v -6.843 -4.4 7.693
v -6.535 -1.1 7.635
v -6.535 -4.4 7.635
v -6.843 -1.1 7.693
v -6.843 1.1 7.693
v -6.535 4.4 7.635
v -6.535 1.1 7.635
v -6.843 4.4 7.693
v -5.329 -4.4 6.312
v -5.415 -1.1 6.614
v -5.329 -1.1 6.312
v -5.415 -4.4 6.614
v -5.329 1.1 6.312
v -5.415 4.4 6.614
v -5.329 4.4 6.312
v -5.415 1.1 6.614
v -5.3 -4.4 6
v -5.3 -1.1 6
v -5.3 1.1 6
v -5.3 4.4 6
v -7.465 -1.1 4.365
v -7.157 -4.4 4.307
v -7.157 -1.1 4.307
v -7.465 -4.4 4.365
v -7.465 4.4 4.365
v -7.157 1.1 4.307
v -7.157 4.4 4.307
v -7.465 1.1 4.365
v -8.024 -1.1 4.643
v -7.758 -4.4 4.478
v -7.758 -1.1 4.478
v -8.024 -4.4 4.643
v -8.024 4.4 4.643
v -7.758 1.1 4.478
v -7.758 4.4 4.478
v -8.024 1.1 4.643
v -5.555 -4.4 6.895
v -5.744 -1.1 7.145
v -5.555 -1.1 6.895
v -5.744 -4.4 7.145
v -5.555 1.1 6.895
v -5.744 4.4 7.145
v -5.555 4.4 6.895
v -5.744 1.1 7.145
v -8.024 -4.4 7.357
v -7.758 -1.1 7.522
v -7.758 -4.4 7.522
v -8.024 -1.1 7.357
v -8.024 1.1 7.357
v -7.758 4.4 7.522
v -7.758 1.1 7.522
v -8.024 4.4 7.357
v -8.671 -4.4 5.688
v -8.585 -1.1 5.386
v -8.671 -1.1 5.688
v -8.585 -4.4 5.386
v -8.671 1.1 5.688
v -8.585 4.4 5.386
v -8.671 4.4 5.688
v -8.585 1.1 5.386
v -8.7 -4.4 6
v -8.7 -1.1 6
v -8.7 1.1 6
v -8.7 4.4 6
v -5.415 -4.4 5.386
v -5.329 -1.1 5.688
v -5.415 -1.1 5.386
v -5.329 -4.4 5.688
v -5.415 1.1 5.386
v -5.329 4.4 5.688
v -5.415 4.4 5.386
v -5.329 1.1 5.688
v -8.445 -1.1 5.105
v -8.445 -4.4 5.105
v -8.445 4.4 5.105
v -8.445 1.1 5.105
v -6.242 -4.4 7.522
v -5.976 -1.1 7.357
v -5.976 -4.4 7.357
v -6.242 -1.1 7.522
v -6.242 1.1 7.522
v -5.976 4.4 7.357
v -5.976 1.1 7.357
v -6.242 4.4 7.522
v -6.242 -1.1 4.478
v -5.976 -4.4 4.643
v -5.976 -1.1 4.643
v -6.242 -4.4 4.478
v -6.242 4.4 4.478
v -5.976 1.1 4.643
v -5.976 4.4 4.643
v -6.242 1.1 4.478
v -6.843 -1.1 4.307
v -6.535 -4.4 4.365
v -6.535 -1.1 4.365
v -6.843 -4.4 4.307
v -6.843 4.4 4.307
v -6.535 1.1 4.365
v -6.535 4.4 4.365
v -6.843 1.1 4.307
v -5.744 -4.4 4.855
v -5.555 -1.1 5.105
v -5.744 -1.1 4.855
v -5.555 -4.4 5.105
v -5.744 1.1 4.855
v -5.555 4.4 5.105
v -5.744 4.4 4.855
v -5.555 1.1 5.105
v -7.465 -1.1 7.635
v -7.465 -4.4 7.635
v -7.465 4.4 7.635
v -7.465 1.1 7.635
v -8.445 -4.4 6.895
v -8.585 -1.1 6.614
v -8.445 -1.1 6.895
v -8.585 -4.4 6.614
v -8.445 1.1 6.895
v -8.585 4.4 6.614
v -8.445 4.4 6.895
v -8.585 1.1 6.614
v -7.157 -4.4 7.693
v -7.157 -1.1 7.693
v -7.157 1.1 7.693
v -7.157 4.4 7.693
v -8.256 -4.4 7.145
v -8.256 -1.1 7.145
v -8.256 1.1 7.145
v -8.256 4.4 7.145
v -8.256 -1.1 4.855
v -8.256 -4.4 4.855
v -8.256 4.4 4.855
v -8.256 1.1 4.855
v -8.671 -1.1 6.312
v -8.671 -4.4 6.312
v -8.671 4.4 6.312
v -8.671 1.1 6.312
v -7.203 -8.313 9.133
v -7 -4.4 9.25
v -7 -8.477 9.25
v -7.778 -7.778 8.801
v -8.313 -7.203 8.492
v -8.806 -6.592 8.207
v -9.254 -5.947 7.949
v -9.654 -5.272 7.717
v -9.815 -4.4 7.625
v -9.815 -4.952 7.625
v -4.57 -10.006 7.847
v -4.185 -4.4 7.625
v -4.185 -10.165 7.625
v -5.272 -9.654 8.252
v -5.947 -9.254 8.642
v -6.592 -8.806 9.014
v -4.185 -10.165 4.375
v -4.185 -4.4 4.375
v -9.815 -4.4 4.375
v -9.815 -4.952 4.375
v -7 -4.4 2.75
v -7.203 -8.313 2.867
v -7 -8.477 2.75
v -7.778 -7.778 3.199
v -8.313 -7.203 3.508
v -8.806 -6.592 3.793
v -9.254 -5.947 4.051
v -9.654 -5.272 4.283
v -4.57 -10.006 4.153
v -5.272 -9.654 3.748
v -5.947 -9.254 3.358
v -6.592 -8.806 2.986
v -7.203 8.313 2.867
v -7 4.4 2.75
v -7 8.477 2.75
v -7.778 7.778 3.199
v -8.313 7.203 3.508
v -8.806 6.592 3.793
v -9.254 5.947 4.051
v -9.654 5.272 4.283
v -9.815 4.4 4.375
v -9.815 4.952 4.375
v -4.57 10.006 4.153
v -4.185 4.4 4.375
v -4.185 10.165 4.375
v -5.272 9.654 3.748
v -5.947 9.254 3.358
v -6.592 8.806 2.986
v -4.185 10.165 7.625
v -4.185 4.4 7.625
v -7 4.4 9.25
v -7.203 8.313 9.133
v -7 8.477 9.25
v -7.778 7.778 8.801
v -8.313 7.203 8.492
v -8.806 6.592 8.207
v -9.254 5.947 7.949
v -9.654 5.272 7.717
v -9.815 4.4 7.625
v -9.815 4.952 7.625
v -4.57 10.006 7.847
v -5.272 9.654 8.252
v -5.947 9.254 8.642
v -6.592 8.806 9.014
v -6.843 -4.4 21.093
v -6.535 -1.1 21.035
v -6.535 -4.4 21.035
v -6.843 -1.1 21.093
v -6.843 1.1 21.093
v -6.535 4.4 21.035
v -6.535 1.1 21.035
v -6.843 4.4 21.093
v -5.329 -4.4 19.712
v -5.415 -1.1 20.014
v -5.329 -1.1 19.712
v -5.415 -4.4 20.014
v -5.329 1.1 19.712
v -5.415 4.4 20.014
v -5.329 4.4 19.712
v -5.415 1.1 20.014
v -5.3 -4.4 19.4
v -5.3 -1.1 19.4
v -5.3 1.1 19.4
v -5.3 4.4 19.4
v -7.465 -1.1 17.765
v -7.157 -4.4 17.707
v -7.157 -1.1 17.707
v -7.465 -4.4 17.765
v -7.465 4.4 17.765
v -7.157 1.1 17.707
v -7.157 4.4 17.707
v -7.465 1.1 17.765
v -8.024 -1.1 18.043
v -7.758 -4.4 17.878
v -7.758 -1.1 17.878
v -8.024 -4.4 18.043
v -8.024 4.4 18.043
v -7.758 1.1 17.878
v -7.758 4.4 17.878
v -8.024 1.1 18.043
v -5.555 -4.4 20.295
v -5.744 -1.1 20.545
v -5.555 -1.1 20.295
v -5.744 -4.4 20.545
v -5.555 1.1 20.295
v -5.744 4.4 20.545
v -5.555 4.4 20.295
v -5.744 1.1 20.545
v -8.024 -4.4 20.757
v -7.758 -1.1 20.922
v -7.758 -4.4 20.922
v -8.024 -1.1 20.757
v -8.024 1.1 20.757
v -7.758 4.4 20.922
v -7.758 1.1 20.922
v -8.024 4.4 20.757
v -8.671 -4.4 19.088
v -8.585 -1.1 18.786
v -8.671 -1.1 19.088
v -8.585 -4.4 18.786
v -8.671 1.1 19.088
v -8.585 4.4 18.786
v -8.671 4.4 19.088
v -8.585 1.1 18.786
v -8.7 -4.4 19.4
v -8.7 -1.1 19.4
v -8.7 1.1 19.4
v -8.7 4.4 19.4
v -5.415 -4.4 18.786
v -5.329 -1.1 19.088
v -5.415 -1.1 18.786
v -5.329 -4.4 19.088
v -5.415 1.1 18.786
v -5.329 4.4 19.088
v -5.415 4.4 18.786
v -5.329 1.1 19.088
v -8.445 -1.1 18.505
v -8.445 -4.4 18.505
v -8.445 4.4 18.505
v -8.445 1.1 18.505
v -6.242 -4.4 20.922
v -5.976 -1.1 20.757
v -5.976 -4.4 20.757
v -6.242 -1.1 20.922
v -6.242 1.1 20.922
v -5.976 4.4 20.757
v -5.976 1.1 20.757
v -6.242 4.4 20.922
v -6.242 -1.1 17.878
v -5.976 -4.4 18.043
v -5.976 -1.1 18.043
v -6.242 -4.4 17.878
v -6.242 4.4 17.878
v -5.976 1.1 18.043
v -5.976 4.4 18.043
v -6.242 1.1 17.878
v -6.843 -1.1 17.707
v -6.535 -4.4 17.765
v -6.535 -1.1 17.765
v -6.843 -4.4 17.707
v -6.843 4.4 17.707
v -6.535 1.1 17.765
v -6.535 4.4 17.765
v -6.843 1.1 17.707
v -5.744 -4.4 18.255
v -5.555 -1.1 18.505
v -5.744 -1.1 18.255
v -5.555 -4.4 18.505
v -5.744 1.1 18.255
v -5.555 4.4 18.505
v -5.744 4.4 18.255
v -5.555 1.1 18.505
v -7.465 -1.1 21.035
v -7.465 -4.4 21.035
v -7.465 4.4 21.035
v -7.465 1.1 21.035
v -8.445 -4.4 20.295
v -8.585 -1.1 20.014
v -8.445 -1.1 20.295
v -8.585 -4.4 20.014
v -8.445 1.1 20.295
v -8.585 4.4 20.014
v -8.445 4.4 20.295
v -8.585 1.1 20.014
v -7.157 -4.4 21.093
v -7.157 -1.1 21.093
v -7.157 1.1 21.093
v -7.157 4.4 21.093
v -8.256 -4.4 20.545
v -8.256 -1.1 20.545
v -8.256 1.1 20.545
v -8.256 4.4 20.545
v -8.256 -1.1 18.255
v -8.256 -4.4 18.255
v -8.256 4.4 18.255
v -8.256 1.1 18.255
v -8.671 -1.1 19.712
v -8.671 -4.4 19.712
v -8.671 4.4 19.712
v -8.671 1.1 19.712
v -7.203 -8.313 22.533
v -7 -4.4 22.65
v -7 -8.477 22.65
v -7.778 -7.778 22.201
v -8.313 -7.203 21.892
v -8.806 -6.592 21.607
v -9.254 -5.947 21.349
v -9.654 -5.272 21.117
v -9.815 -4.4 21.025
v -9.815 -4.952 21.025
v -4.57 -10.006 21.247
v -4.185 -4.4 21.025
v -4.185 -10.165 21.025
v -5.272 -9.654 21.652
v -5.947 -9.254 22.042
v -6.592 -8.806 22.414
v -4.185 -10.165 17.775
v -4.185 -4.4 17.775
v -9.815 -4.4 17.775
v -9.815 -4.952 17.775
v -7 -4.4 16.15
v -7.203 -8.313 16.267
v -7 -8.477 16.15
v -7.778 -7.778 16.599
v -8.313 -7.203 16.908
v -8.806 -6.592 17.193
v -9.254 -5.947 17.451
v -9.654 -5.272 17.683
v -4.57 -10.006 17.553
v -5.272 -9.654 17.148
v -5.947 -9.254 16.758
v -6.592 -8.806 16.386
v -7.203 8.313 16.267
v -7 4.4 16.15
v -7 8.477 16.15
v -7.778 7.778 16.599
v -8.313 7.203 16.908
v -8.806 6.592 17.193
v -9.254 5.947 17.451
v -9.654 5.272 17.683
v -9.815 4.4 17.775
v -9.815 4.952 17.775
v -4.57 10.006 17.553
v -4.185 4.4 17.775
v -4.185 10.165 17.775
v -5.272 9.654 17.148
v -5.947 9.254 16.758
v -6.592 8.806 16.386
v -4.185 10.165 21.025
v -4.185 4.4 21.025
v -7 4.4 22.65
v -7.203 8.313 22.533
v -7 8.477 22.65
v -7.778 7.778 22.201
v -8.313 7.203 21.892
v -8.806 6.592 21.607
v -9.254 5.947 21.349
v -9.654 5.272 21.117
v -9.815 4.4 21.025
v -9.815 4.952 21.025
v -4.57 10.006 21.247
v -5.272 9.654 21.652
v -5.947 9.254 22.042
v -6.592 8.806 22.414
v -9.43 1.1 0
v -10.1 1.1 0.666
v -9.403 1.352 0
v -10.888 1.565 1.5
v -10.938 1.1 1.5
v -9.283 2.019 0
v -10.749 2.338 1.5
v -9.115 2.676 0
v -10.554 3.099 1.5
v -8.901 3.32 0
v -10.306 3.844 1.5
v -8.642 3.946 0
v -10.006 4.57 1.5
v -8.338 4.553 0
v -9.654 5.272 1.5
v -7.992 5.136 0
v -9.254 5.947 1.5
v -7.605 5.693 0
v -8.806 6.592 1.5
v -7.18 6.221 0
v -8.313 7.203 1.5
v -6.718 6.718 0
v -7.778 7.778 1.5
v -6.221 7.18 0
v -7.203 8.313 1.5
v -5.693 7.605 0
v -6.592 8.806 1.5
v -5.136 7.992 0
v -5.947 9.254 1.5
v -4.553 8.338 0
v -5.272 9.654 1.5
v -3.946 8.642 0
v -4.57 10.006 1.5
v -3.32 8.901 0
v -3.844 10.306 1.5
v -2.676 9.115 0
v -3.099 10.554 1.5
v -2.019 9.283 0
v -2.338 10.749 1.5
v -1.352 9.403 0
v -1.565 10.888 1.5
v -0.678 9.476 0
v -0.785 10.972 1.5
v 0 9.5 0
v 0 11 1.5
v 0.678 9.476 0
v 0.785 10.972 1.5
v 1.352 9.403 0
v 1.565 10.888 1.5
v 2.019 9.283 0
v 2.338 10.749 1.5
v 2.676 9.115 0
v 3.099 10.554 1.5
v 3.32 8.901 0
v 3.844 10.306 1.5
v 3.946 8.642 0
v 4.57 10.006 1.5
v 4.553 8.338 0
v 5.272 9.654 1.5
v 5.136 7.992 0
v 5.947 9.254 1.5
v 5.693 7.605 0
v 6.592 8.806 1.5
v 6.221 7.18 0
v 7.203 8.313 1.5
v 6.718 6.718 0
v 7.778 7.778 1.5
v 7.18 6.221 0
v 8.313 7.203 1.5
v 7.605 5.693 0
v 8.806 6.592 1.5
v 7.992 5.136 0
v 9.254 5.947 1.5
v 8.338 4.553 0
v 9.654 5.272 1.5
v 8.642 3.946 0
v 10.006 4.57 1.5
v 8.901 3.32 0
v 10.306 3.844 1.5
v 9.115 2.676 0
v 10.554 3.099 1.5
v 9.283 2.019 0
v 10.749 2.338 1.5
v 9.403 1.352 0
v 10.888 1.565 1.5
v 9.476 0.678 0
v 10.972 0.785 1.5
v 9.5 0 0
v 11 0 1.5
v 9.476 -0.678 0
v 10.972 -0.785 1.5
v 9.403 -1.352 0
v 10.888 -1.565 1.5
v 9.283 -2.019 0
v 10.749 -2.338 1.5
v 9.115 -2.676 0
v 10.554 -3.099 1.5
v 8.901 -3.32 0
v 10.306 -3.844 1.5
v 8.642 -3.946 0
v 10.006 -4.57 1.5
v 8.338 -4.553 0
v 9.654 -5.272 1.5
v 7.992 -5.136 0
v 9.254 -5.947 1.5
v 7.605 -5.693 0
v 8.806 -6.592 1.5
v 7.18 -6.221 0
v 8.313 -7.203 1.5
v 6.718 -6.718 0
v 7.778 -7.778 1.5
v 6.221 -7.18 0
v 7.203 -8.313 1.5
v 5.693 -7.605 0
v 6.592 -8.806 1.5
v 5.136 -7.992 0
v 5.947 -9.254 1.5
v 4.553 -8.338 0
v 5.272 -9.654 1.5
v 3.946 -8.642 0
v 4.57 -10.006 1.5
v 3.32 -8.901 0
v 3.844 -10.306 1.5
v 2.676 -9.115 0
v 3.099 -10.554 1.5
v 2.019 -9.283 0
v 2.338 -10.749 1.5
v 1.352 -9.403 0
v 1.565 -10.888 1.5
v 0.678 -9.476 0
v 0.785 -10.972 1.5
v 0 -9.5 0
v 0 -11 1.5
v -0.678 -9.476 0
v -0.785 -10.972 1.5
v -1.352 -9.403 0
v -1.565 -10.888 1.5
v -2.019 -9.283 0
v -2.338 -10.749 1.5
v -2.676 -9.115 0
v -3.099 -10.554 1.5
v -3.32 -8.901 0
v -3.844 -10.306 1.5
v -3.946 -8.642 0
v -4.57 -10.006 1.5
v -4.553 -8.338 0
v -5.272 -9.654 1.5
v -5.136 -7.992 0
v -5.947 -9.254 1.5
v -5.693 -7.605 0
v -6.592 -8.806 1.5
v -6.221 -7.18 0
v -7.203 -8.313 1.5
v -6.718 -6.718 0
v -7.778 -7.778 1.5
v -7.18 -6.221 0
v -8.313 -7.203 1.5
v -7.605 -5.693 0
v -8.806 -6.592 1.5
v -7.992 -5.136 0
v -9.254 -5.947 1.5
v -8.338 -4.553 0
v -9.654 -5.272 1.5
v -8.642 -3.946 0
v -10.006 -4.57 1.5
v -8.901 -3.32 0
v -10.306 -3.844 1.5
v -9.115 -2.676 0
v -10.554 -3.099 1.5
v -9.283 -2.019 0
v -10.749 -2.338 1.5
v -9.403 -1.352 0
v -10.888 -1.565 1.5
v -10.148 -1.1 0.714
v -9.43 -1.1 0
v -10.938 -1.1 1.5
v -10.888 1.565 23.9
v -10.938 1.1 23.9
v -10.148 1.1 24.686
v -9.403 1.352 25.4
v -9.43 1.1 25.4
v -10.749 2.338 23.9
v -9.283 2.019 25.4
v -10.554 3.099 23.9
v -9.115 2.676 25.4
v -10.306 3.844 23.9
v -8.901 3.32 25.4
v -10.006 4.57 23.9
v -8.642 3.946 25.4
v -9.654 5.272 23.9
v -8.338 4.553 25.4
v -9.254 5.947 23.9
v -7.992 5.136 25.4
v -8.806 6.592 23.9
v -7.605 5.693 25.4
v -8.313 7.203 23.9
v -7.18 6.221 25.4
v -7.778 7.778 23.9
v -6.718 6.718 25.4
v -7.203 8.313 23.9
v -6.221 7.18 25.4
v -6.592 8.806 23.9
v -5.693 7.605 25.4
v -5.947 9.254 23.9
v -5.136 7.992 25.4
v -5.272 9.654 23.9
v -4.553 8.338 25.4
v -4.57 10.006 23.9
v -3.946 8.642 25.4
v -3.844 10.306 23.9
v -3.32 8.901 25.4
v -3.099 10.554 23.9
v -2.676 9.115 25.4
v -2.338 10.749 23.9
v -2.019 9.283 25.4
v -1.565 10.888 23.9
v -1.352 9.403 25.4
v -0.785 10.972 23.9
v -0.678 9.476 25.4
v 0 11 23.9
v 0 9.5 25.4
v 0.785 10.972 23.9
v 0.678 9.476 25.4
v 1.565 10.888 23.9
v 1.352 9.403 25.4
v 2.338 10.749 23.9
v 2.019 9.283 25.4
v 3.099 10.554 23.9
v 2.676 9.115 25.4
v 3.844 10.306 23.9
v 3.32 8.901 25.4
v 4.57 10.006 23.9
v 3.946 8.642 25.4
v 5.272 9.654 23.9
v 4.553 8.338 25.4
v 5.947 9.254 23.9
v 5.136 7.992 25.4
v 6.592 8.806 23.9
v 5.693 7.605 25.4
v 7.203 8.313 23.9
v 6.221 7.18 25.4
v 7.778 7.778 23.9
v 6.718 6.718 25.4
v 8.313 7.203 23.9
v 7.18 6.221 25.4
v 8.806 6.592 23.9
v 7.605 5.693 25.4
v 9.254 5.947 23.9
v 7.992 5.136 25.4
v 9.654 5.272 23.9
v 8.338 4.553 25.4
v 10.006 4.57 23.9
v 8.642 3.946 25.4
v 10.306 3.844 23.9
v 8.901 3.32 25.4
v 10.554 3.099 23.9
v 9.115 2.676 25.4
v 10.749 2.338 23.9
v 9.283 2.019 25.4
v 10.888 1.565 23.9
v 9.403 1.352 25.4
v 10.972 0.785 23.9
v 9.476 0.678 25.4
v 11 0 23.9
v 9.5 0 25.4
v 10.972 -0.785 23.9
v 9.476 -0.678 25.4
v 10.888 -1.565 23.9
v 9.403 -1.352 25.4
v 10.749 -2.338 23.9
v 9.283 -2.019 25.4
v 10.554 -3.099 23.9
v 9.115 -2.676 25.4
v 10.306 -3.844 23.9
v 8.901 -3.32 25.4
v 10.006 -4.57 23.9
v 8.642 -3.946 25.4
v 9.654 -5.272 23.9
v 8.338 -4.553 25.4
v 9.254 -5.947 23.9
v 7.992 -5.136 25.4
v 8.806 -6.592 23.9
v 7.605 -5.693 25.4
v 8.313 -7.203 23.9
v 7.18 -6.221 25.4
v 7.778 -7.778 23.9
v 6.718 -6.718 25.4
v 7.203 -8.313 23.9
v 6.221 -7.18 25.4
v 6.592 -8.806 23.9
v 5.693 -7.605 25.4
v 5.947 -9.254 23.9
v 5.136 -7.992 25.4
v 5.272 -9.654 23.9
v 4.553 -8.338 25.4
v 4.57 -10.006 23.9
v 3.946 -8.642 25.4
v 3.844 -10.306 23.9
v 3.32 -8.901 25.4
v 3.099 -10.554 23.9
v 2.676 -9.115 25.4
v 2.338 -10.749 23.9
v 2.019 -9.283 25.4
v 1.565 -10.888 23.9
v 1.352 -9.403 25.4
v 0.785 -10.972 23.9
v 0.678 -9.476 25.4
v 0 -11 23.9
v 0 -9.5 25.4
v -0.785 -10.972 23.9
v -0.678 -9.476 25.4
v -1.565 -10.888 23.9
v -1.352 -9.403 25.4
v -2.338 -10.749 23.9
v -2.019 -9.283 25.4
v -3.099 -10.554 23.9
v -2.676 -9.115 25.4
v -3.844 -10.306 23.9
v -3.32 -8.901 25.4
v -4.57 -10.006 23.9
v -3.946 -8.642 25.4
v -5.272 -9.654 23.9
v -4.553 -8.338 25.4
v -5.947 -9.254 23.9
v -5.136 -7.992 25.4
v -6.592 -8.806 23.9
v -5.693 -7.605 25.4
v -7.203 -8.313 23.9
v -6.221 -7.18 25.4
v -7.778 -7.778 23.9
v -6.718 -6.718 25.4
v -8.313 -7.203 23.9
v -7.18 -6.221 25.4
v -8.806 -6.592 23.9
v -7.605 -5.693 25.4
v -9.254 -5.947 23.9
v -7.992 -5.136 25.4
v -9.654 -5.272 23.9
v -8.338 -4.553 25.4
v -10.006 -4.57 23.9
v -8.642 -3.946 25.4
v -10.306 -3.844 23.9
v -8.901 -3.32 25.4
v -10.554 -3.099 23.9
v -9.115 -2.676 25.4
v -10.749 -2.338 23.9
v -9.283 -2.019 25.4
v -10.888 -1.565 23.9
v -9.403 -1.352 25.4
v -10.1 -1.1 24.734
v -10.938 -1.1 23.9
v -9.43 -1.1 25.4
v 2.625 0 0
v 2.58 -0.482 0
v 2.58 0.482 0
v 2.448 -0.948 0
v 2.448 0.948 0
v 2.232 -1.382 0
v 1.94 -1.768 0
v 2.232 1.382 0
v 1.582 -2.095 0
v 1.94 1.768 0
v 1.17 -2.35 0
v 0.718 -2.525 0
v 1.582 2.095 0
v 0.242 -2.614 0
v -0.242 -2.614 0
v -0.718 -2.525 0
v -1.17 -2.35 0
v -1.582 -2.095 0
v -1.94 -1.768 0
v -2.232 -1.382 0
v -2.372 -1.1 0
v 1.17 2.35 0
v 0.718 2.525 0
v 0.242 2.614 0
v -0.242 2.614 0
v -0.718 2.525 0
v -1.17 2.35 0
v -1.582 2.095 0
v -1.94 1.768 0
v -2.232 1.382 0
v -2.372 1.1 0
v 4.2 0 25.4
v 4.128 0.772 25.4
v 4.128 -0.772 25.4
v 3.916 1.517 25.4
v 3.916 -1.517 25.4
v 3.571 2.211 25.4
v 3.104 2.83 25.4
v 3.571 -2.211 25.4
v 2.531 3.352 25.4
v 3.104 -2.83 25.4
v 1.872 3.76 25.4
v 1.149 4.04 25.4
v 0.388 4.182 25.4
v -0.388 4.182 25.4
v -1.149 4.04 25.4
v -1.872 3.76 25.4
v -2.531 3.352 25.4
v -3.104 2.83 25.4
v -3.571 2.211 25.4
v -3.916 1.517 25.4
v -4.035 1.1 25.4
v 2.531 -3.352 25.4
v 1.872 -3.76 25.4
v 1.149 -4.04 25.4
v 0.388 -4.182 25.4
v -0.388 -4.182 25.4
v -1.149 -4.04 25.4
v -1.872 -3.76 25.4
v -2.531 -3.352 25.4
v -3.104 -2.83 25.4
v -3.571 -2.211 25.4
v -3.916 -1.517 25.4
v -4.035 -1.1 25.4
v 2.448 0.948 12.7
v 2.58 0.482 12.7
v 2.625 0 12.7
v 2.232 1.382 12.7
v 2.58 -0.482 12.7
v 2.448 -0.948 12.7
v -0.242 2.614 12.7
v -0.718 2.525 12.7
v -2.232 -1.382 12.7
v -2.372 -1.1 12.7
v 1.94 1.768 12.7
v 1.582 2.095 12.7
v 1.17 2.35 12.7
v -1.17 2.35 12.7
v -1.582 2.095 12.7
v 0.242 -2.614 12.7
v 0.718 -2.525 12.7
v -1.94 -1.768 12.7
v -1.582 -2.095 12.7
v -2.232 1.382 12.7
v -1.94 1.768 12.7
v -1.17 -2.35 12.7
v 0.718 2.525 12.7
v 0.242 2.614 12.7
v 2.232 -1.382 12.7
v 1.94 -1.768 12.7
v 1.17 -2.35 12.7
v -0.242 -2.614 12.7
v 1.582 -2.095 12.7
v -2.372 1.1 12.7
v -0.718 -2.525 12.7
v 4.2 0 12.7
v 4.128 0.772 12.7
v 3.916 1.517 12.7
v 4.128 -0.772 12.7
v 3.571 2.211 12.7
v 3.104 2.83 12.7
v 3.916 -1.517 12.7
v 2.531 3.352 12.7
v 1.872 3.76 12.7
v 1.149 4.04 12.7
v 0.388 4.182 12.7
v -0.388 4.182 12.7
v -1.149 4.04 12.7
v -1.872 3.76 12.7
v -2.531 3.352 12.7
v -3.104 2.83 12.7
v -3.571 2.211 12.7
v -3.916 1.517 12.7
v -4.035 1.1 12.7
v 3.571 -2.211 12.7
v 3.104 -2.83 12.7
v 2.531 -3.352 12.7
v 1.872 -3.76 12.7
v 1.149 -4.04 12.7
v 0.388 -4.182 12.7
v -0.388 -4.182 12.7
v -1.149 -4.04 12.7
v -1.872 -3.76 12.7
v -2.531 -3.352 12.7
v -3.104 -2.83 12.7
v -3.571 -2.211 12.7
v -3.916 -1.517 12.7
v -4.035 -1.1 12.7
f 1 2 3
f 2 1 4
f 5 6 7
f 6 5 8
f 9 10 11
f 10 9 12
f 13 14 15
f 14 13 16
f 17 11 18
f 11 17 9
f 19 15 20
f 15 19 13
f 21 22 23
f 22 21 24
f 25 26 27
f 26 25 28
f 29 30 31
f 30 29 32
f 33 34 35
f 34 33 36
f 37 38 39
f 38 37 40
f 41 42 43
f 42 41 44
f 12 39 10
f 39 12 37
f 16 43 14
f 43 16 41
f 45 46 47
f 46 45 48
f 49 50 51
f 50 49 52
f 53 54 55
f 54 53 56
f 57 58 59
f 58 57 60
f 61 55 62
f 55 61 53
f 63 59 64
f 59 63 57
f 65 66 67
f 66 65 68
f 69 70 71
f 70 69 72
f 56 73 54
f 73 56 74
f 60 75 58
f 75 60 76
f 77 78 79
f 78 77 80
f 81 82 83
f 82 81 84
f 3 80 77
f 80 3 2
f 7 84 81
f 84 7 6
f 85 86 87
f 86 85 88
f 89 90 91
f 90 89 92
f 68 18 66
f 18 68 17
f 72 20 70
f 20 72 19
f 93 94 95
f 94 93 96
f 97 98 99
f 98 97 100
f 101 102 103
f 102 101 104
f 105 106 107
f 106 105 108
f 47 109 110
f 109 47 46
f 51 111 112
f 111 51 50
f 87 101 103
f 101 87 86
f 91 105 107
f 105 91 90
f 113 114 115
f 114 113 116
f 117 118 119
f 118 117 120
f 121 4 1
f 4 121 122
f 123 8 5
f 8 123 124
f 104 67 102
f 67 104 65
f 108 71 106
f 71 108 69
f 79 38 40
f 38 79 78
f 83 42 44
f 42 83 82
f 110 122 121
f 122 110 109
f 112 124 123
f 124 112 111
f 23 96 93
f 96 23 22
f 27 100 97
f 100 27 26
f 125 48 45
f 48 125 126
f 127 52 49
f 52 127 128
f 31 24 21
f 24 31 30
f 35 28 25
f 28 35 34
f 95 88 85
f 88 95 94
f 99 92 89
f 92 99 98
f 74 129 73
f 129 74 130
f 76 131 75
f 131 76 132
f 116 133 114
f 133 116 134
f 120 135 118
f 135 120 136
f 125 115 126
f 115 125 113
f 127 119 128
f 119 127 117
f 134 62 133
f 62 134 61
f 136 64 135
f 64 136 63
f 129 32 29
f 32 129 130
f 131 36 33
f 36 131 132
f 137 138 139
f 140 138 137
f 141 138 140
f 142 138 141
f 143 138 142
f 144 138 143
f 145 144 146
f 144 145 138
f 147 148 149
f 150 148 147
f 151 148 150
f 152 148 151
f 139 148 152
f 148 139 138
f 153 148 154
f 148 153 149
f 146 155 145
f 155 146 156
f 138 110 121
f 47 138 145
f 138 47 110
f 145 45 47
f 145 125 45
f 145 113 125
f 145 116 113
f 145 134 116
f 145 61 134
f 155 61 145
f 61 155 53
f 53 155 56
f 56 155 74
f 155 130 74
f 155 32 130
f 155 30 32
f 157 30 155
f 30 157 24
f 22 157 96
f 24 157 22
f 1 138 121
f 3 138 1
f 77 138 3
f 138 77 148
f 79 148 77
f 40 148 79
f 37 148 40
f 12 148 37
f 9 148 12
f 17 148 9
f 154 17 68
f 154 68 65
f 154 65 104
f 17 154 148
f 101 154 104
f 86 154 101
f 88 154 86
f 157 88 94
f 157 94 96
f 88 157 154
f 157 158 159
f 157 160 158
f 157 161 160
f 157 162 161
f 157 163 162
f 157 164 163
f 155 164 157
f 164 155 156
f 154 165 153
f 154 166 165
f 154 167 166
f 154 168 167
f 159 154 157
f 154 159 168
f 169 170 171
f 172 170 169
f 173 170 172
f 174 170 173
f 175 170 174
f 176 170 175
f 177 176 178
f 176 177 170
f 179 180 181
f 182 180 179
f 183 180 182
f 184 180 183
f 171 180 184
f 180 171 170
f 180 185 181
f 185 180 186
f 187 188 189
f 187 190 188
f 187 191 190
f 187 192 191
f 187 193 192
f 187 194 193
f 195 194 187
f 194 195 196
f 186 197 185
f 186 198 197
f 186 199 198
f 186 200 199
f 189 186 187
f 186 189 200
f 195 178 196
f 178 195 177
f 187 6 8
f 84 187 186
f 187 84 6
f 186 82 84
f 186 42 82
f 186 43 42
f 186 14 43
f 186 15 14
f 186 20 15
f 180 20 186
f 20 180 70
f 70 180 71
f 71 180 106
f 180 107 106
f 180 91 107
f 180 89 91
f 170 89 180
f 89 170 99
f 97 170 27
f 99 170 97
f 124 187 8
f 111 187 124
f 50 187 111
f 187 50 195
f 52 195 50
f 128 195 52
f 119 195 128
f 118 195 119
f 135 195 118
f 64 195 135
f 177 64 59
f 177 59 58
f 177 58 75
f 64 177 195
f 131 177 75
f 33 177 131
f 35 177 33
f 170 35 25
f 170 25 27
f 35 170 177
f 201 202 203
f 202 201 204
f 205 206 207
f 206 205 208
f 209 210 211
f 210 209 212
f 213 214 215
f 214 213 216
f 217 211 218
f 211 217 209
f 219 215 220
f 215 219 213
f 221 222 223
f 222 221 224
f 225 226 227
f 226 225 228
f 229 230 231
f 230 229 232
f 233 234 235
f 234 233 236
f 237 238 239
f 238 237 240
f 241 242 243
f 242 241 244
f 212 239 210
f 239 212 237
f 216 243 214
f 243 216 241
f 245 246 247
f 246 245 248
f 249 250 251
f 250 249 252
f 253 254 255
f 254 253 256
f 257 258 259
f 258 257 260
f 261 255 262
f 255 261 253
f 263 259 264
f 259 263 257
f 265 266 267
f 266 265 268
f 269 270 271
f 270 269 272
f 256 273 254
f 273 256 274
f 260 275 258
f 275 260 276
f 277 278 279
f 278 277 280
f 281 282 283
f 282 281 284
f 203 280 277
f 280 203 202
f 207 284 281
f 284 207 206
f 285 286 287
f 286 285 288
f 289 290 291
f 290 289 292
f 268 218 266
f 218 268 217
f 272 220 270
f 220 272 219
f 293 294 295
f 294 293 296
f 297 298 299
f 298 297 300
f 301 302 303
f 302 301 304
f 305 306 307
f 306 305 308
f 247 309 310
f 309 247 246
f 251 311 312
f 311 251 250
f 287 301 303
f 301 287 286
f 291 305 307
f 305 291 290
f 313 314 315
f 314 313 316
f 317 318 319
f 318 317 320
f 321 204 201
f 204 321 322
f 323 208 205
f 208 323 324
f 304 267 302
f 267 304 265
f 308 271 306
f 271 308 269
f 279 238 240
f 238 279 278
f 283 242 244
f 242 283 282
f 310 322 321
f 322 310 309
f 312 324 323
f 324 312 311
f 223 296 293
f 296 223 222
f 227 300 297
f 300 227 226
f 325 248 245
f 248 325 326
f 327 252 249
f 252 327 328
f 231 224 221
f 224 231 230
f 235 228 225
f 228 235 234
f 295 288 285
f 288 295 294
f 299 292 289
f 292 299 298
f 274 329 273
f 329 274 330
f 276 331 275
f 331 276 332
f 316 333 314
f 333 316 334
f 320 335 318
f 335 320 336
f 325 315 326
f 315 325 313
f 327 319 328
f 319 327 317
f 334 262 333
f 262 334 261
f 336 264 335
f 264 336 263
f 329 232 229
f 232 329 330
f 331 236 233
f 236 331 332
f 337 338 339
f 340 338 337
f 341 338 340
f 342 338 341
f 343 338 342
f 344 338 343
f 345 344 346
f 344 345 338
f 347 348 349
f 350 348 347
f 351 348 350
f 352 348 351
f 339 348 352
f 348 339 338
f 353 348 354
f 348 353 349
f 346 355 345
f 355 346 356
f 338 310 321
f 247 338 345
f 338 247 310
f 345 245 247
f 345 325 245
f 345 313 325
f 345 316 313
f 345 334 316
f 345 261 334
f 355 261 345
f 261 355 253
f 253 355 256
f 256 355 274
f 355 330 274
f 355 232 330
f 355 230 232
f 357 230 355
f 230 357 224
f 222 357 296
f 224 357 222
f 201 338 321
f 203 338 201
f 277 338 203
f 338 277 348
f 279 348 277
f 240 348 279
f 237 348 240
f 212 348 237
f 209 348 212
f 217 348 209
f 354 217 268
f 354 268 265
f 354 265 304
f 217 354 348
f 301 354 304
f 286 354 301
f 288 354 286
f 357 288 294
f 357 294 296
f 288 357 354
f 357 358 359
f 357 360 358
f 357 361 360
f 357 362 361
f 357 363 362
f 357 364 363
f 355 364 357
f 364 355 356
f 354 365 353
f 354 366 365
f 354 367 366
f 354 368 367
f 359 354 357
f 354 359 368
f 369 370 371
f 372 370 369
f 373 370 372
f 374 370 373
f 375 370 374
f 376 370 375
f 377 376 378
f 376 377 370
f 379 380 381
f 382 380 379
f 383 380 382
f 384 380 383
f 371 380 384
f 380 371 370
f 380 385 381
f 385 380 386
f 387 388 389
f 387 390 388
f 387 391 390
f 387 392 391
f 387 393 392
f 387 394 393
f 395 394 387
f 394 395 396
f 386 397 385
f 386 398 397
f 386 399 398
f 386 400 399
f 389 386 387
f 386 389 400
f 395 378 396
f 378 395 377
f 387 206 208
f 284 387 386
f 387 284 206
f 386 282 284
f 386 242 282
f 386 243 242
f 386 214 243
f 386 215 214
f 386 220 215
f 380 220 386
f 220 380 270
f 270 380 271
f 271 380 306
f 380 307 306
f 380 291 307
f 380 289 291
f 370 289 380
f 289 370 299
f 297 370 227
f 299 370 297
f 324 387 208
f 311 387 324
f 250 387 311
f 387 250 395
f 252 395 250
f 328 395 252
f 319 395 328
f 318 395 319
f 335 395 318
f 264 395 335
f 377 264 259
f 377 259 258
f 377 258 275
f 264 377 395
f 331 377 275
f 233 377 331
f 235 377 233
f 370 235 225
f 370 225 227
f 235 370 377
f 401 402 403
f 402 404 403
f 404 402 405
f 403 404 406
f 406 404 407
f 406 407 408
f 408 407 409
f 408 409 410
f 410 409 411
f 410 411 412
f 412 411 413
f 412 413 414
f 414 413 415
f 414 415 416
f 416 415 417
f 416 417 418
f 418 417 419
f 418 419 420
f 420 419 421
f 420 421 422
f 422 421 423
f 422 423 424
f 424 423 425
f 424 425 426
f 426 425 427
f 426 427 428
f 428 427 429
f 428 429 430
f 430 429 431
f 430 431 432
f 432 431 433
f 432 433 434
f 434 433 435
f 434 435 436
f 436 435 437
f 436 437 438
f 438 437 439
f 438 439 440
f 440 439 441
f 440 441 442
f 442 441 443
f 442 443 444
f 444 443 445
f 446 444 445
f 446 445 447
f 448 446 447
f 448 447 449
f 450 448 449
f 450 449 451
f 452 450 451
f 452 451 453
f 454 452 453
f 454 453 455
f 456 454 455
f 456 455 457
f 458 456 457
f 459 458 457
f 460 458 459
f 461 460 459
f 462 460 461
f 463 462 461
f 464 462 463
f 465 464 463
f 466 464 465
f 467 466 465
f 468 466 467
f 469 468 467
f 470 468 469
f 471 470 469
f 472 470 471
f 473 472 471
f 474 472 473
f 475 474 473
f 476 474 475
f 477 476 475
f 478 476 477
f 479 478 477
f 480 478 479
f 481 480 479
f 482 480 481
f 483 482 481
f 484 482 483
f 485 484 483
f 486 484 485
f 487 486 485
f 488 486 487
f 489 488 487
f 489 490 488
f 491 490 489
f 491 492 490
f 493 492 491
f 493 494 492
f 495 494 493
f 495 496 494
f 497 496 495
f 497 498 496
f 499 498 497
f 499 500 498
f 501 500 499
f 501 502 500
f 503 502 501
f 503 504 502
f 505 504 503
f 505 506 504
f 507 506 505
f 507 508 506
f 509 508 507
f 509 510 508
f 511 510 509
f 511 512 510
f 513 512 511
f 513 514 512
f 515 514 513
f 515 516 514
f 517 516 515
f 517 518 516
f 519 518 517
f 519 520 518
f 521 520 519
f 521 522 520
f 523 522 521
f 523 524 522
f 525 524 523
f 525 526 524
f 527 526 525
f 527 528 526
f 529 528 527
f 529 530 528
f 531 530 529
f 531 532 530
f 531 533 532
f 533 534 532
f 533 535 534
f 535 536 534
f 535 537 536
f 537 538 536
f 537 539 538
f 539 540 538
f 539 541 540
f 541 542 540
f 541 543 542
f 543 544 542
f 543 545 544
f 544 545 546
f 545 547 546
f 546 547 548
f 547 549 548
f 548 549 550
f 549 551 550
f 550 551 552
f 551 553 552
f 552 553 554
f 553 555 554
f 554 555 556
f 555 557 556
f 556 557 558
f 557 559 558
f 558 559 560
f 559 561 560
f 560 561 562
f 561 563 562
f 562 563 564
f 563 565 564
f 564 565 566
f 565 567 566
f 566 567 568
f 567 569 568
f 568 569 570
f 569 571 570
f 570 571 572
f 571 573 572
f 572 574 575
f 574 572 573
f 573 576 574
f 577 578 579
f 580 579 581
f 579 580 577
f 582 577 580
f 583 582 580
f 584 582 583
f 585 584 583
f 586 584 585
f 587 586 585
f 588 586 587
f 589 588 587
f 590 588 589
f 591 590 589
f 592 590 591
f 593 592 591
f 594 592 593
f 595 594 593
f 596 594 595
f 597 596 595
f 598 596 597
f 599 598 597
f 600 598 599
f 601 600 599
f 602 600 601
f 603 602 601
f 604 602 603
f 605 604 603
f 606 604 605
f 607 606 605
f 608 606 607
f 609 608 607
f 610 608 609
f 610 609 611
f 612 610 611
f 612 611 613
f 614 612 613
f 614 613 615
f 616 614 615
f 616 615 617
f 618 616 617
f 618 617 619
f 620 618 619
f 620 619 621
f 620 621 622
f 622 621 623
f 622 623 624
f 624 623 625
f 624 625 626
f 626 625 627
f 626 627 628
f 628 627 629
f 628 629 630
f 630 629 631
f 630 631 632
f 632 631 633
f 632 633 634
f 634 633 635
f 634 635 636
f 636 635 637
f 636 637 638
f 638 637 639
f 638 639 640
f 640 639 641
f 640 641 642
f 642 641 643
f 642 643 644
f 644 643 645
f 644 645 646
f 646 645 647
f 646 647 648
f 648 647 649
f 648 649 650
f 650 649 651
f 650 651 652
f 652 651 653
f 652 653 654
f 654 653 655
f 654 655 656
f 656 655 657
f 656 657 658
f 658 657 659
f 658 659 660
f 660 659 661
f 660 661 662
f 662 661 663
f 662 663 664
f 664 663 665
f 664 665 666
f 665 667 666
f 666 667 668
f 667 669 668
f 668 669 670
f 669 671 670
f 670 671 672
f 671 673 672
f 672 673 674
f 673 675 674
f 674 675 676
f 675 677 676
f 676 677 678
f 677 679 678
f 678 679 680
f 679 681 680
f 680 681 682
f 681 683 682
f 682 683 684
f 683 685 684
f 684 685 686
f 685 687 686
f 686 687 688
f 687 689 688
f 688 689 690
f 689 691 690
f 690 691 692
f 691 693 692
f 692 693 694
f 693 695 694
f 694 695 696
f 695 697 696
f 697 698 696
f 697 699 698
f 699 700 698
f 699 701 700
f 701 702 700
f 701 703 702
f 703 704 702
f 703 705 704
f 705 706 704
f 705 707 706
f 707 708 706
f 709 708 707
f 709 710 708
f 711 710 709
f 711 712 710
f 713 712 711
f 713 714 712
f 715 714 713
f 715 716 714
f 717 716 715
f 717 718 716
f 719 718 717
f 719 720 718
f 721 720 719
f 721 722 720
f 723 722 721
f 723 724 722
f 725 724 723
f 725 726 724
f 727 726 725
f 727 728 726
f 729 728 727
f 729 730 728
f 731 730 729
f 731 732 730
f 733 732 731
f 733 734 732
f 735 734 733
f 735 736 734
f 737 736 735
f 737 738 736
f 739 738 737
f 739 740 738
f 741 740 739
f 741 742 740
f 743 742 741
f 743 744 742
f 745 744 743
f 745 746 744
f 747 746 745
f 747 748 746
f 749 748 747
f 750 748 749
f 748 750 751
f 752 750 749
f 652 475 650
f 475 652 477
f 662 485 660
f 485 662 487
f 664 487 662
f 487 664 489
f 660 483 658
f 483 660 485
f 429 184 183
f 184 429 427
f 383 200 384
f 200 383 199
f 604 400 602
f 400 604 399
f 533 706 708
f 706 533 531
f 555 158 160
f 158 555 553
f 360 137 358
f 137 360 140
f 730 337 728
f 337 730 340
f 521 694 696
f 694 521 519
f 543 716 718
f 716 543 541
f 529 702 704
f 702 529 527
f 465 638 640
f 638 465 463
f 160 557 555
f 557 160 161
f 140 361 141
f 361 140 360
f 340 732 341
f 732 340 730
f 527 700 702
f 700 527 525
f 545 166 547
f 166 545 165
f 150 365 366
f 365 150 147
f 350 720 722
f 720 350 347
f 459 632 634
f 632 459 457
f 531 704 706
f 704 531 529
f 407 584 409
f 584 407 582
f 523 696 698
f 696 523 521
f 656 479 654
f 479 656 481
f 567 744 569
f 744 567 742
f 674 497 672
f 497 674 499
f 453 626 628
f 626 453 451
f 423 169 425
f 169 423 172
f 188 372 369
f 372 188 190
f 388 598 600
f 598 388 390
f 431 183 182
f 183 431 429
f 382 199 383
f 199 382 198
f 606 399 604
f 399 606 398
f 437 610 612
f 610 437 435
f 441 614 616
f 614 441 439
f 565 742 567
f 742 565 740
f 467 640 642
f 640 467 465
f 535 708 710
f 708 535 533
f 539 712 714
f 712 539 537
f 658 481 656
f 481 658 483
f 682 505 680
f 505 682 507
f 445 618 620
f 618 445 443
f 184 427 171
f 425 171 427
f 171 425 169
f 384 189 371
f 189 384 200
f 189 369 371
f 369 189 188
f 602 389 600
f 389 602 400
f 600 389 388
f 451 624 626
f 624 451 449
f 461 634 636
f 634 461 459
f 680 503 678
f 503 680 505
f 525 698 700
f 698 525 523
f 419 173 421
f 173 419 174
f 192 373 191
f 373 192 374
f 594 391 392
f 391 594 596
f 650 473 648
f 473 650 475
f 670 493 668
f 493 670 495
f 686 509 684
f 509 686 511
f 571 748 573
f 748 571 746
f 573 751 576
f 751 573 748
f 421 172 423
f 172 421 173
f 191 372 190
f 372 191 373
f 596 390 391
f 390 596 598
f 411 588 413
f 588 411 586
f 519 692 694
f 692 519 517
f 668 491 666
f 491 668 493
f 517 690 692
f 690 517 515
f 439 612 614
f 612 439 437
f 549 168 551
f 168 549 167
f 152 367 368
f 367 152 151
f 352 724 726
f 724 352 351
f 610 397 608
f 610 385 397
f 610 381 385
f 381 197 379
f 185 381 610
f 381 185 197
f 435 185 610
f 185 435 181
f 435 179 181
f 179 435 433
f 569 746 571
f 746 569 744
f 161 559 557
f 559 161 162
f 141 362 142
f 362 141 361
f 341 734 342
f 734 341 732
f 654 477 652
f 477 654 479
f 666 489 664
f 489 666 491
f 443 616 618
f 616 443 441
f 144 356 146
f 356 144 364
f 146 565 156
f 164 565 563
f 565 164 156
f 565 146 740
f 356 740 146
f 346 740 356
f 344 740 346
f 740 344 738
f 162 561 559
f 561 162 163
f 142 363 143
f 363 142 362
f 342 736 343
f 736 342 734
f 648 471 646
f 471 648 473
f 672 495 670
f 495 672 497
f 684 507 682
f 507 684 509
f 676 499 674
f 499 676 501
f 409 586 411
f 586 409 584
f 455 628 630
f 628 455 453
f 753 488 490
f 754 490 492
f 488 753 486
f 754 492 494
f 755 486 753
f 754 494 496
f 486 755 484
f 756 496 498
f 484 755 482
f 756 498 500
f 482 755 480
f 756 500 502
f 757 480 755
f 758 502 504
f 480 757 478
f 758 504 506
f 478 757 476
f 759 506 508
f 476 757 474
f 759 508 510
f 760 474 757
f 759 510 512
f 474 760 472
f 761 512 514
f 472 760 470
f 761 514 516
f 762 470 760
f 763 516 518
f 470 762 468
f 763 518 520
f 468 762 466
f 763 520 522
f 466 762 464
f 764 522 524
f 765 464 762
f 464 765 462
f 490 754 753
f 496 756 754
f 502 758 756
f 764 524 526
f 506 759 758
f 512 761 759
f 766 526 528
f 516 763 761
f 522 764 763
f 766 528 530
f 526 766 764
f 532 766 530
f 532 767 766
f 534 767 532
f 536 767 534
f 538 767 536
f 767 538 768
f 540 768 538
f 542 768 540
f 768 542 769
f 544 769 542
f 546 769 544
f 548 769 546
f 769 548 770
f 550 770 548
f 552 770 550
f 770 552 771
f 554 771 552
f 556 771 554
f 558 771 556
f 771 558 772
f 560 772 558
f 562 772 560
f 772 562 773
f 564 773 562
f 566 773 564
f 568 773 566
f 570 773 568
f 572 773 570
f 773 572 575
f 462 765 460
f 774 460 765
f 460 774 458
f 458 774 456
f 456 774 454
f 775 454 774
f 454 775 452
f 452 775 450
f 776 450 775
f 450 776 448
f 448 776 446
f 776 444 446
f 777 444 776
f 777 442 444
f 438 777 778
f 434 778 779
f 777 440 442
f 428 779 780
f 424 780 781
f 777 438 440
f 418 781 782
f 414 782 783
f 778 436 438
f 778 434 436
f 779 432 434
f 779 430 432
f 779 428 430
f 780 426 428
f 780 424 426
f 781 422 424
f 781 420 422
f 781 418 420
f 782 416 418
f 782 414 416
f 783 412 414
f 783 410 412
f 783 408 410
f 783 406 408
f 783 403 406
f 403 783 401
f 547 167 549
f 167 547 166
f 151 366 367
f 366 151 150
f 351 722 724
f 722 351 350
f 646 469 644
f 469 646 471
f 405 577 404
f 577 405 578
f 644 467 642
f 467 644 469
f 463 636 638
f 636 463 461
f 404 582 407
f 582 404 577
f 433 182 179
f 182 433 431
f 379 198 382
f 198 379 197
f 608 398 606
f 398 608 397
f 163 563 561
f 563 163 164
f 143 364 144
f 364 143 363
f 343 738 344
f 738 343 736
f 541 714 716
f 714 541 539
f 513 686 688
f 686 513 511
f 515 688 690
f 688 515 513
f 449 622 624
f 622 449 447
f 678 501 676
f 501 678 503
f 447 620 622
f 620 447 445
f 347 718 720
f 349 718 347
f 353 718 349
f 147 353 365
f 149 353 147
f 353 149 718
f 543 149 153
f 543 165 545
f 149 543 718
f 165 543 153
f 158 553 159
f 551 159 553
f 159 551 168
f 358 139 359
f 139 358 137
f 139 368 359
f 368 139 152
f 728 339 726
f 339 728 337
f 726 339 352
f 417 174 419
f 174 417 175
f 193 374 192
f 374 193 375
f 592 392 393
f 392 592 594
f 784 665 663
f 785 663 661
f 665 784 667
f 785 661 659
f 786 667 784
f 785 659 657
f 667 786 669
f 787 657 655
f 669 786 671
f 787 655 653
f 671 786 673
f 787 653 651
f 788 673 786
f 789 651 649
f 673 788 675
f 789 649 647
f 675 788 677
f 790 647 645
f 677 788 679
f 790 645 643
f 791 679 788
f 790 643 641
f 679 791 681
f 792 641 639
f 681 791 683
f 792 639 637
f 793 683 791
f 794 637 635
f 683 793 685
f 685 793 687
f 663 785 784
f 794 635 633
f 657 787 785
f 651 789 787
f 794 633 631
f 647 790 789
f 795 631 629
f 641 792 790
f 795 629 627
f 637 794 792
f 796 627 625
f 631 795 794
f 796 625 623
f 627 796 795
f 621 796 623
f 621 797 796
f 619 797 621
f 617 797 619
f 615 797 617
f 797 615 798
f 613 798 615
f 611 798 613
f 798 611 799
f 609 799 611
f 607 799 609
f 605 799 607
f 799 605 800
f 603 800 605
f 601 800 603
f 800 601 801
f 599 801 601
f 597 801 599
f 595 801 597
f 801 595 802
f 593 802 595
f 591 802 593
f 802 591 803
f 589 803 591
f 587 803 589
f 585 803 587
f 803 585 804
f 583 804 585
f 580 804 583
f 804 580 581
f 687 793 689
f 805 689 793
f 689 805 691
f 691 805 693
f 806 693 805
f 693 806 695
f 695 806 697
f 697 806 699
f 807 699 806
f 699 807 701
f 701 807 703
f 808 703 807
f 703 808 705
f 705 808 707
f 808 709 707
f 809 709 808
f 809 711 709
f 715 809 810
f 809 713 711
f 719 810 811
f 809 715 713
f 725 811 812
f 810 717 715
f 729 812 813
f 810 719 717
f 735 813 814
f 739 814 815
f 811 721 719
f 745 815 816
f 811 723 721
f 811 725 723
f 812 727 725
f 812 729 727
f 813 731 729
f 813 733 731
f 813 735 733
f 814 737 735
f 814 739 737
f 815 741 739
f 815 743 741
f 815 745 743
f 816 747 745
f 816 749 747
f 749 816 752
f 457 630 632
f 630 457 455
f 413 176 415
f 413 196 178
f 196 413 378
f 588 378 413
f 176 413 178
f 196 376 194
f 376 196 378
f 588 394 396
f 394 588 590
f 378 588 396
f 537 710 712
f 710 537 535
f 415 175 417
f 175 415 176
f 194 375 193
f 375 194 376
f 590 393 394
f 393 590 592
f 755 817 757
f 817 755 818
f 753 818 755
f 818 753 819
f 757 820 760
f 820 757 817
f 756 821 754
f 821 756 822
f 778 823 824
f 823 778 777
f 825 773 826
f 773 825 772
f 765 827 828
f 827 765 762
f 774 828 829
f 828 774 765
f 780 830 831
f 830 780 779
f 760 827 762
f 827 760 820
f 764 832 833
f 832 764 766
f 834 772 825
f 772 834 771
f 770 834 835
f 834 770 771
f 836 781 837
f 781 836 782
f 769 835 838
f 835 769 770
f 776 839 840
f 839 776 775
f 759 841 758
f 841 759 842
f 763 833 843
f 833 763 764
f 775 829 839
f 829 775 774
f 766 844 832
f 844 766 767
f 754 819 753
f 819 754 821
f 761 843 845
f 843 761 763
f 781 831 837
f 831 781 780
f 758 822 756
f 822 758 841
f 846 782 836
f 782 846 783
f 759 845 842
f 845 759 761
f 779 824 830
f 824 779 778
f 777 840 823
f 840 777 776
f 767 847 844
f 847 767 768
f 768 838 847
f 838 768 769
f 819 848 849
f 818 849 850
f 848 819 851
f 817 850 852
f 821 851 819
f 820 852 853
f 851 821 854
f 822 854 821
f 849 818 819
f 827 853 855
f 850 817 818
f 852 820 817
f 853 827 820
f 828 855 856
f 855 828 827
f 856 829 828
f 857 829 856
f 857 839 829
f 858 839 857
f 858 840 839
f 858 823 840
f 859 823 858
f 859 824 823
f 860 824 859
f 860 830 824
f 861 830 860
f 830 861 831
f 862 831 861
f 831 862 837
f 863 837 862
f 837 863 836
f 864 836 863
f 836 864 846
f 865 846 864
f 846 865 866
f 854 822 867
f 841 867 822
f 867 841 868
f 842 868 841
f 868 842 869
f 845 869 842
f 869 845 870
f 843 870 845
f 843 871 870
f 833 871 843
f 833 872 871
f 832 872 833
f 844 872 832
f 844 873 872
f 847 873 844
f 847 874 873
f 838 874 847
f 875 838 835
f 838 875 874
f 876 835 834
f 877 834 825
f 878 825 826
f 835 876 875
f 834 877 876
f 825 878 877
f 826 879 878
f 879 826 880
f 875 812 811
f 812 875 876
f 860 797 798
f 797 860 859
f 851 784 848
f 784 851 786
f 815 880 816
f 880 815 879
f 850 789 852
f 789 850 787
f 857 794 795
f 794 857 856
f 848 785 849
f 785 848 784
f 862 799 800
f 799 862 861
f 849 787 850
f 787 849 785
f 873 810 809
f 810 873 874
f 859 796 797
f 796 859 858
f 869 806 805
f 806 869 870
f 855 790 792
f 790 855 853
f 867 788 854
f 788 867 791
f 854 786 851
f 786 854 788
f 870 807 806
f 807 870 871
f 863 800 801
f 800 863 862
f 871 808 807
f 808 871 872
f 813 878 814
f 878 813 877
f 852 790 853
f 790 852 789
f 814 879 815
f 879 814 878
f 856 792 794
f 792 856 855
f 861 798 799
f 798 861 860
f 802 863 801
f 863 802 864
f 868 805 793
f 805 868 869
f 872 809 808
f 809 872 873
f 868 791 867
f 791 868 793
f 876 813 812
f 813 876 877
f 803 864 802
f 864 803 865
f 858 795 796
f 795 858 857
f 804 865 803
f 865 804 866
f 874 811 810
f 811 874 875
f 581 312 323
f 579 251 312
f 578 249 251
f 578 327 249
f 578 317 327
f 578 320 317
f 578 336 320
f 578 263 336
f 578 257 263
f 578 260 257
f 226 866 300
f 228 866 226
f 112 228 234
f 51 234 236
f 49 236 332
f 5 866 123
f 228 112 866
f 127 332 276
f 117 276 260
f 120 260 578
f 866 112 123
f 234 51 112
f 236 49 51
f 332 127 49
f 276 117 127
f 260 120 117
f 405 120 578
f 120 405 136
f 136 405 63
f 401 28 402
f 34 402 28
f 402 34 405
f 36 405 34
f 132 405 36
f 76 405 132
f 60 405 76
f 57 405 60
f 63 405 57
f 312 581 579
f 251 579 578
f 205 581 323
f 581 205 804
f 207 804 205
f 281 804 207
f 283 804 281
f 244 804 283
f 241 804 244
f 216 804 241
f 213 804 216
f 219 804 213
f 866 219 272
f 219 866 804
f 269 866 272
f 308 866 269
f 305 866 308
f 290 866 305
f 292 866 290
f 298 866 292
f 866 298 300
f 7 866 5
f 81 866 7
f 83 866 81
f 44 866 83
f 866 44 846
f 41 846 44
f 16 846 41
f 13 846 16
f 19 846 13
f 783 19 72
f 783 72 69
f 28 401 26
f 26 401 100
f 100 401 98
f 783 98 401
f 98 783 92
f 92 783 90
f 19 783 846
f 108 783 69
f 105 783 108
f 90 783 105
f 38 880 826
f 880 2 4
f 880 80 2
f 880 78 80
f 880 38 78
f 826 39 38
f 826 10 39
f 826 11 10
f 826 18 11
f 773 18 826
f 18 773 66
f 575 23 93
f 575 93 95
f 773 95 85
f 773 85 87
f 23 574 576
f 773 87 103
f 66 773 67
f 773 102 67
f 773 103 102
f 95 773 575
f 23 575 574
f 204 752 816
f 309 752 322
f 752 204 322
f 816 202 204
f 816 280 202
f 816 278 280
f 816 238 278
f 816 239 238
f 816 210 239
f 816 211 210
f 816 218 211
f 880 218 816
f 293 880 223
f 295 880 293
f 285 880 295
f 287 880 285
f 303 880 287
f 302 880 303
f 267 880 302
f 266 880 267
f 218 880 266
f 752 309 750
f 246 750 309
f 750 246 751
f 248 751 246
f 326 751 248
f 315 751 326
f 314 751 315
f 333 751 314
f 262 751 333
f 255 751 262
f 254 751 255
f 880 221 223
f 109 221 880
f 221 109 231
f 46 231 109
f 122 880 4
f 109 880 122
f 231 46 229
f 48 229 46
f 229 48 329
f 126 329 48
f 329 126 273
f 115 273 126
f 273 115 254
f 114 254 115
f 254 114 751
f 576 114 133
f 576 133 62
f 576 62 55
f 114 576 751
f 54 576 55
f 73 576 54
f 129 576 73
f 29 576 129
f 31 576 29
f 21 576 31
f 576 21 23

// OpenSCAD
//Parametric Coupler
//By David Bunch 8/9/2015
//
//This design is based on the Rigid Coupler for the
//Mostly printed CNC machine http://www.thingiverse.com/thing:724999
//To couple different or same size Shafts together,
//usually a nema 17 motor to a threaded rod
//The little bolts used to tighten this design are M3 x 14mm or 16mm length
//CUSTOMIZER VARIABLES

//1. Outside Diameter of Coupler (try 20 for 5mm to 5mm)
OD = 22;

//2. Total Height of Coupler
Ht = 25.4;

//3. Small Coupler Connection (5mm default)
ShaftSmall = 5.25;              //Add 5% to make more of a slip fit
                                //Tightening bolts will snug this up
                               //6.66 = 1/4"(6.35mm)

//4. Large Coupler Connection (8mm default)
ShaftLarge = 8.4;              //Add 5% to make more of a slip fit
                               //8.4 = 8mm, 6.3 = 6mm, 5.25 = 5mm


//5. Gap Cut size for Tightening Coupler
GapDist = 2.2;

//6. Coupling Bolt Diameter used for Tightening (M3 default)
M3 = 3.4;              //Use 3.65 for #6 bolts

//7. Coupling Bolt Diameter used for Tightening
M3Nut = 6.5;           //if using #6 Nuts use 9.25mm
                        //4mm nuts 8.08mm (
                        //3mm nuts 6.5mm (This size worked good for me)

//8. Bolt Length (14mm long bolt is default)
BoltLen = 14;         //This should still be a good length for
                        //14mm or 16mm length bolts will just
                        //        stick out a little beyond locknut

//9. X Offset for Bolt Tightening Holes (try 6 for 5mm to 5mm)
M3_DX=7;

//10. 1st Z Offset for Bolt Tightening Holes
M3_DZ1 = 6;

//11. 2nd Z Offset for Bolt Tightening Holes
M3_DZ2 = 19.4;

//12. Resolution large Circles
IresBig = 88;

//13. Resolution of Small Circles
IresSmall = 34;

//14. Chamfer Radius at Top & bottom
ChamferSize = 1.5;        //Set width of chamfer at top & bottom

//15. 1 part or 2 Halves
PartType = 1;   //2 Halves are useful if your 2 shafts are already in place

//CUSTOMIZER VARIABLES END

M3_Thk = (BoltLen - GapDist - 5.2) / 2;
echo("M3_Thk = ", M3_Thk);

GapHalf = GapDist / 2;
M3Nut_DY = M3_Thk + GapHalf;

Rad = OD / 2;

//This is the Chamfer used at the bottom & top of coupling
module ChamferCyl()
{
    if (ChamferSize > 0)
    {
        rotate_extrude(convexity = 10, $fn = IresBig)
        translate([Rad, 0, 0])
        circle(r = ChamferSize, $fn = 4);
    }
}
//These are the holes for the tightening bolts & nuts
module BoltAndNutCut()
{
//Drill hole all the way through
    translate([-M3_DX,Rad,0])
    rotate([90,0,0])
    cylinder(d=M3,h=OD,$fn=IresSmall);
//Cut for hex nut on one end
    translate([-M3_DX,-M3Nut_DY,0])
    rotate([90,0,0])
    rotate([0,0,30])
    cylinder(d=M3Nut,h=Rad,$fn=6); 
//Cut for hex nut on the other end
    translate([-M3_DX,M3Nut_DY,0])
    rotate([-90,0,0])
    rotate([0,0,30])
    cylinder(d=M3Nut,h=Rad,$fn=6);
}
module HorizontalHoles()
{
    translate([0,0,M3_DZ1])
    BoltAndNutCut();            //Lower Horizontal Hole
    translate([0,0,M3_DZ2])
    BoltAndNutCut();            //Upper Horizontal Hole
}
//Cut out the holes, gap & draw final part
module DrawFinal()
{
    difference()
    {
        cylinder(d=OD,h=Ht,$fn=IresBig);        //Draw the main cylinder
        translate([0,0,-1])
        cylinder(d=ShaftSmall,h=Ht+2,$fn=IresSmall);    //Cut small shaft hole from bottom
        translate([0,0,Ht / 2])                         //Start 2nd hole half way up
        cylinder(d=ShaftLarge,h=Ht,$fn=IresSmall);      //Cut large or same size shaft hole
        translate([-(Rad+.01),-GapHalf,-1])
        cube([Rad,GapDist,Ht+2]);       //Cut gap for tightening
//Cut bottom bolt tightening hole
        HorizontalHoles();  //Cut horizontal holes for tightening bolts
//See if user wants to draw this as 2 halves instead of just 1 gap cut
        if (PartType == 2)
        {
            rotate([0,0,180])
            {
                HorizontalHoles();  //Cut horizontal holes for tightening bolts
                translate([-(Rad+.01),-GapHalf,-1])
                cube([Rad,GapDist,Ht+2]);       //Cut gap for tightening
            }
        }
        if (ChamferSize > 0)
        {
            ChamferCyl();                   //Chamfer the top
            translate([0,0,Ht])
            ChamferCyl();                   //Chamfer the bottom
        }
    }
}


DrawFinal();
